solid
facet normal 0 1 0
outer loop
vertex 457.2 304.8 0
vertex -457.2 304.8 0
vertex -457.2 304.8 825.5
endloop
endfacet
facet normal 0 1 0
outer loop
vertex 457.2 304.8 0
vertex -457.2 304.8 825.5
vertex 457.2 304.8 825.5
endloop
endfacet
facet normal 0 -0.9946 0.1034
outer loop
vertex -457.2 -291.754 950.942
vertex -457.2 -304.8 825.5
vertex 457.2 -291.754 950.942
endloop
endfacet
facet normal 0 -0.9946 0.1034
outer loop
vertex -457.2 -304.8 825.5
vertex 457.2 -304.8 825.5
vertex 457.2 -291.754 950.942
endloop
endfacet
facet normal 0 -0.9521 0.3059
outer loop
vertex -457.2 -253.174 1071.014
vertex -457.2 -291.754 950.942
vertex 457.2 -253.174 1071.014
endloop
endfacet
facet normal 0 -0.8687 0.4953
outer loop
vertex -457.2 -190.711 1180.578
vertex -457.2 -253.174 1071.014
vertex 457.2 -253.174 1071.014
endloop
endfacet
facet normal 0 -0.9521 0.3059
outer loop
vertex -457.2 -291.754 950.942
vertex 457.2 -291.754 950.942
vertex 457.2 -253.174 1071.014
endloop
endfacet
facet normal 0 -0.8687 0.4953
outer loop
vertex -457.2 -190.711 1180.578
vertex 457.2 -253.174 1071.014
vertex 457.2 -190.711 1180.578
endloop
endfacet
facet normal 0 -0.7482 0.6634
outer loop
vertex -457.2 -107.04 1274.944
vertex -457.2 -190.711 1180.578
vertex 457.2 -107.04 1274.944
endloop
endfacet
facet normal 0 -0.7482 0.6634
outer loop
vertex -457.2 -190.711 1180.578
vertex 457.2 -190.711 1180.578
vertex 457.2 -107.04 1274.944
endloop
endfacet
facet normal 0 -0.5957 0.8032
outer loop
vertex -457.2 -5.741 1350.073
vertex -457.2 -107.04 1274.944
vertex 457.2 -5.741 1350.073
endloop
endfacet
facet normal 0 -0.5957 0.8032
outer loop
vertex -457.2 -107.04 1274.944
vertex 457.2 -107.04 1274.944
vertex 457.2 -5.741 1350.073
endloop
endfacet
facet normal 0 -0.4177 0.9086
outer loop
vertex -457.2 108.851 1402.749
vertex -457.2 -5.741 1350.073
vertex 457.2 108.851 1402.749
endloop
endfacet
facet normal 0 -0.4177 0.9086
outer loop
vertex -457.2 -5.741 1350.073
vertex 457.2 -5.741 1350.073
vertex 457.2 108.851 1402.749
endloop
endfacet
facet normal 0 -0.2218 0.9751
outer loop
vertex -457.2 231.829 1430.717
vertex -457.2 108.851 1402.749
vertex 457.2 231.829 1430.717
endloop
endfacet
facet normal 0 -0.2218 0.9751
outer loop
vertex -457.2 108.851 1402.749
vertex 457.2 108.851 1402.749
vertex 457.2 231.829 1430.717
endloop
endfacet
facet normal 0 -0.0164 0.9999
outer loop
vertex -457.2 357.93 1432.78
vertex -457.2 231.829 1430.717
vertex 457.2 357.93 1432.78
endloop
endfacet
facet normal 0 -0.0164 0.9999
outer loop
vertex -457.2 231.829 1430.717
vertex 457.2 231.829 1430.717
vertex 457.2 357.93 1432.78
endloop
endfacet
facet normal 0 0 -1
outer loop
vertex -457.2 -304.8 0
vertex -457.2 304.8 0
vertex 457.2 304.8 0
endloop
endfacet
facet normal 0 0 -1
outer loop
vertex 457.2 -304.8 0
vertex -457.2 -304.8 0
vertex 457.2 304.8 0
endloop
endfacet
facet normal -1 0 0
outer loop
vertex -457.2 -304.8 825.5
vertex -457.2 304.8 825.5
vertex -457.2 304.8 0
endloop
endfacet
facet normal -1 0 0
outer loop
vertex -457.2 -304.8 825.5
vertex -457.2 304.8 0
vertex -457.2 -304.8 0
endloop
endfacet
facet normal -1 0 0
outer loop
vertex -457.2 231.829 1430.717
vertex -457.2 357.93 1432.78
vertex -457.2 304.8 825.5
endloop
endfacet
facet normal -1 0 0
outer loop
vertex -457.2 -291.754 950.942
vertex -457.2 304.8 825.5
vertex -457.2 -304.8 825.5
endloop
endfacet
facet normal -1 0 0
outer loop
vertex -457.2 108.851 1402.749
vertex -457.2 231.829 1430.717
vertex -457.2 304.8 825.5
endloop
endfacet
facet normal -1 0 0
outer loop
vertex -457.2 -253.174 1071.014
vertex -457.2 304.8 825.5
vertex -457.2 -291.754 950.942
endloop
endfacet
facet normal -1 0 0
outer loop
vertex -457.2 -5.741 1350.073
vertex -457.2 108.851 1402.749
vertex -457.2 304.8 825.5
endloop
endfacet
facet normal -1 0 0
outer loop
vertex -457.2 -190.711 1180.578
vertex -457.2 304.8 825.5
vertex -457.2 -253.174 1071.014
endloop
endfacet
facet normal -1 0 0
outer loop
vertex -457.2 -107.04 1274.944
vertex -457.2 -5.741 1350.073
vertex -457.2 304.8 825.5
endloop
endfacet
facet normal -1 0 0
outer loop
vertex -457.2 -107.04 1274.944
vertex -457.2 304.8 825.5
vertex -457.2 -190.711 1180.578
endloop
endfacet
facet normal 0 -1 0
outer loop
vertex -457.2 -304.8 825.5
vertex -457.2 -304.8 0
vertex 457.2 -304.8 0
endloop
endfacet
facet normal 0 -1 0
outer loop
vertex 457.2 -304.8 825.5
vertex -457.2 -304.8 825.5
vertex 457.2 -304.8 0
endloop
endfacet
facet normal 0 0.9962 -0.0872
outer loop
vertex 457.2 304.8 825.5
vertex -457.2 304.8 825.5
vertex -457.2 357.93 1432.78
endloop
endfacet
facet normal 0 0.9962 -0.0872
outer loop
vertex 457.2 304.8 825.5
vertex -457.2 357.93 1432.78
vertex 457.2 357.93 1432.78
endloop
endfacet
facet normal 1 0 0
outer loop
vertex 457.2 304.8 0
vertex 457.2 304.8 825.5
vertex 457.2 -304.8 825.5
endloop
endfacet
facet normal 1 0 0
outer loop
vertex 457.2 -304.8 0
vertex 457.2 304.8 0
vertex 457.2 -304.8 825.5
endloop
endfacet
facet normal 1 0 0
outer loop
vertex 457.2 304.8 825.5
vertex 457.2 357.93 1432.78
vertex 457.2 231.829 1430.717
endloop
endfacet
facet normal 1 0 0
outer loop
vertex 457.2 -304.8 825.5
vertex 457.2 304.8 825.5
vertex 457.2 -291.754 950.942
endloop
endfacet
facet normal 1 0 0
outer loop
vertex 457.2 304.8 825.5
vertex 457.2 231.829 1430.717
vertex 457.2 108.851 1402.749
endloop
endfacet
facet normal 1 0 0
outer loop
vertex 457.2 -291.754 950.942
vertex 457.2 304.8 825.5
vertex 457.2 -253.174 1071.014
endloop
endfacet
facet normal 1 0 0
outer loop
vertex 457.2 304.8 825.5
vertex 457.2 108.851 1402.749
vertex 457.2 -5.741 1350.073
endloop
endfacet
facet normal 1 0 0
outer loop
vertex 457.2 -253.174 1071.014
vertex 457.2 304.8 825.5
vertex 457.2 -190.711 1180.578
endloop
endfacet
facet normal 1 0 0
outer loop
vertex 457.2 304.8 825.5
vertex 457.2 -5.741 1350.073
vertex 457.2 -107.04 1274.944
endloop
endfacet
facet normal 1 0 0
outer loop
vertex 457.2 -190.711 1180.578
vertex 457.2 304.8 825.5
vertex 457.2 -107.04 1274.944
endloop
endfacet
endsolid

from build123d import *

# Parameters (mm, degrees)
F2_W     = 914.4
F2_H     = 609.6
F3_DEPTH = 825.5
F4_W     = 914.4
F4_H     = 609.6
F5_ANGLE = 95


# Not quite as in the source:
# - a variable given as a bare number and used for a length is read in inches; the dataset says mm whatever the document's units were


with BuildPart() as f3:
    # F2 (on Top) → F3 (new body)
    with BuildSketch(Plane.XY):
        Rectangle(F2_W, F2_H)
    extrude(amount=F3_DEPTH)

    # F4 (on face) → F5 (revolve)
    with BuildSketch(Plane.XY.offset(825.5)):
        Rectangle(F4_W, F4_H)
    revolve(axis=Axis((0, 304.8, 825.5), (-1, 0, 0)), revolution_arc=F5_ANGLE)


solid = f3.part
